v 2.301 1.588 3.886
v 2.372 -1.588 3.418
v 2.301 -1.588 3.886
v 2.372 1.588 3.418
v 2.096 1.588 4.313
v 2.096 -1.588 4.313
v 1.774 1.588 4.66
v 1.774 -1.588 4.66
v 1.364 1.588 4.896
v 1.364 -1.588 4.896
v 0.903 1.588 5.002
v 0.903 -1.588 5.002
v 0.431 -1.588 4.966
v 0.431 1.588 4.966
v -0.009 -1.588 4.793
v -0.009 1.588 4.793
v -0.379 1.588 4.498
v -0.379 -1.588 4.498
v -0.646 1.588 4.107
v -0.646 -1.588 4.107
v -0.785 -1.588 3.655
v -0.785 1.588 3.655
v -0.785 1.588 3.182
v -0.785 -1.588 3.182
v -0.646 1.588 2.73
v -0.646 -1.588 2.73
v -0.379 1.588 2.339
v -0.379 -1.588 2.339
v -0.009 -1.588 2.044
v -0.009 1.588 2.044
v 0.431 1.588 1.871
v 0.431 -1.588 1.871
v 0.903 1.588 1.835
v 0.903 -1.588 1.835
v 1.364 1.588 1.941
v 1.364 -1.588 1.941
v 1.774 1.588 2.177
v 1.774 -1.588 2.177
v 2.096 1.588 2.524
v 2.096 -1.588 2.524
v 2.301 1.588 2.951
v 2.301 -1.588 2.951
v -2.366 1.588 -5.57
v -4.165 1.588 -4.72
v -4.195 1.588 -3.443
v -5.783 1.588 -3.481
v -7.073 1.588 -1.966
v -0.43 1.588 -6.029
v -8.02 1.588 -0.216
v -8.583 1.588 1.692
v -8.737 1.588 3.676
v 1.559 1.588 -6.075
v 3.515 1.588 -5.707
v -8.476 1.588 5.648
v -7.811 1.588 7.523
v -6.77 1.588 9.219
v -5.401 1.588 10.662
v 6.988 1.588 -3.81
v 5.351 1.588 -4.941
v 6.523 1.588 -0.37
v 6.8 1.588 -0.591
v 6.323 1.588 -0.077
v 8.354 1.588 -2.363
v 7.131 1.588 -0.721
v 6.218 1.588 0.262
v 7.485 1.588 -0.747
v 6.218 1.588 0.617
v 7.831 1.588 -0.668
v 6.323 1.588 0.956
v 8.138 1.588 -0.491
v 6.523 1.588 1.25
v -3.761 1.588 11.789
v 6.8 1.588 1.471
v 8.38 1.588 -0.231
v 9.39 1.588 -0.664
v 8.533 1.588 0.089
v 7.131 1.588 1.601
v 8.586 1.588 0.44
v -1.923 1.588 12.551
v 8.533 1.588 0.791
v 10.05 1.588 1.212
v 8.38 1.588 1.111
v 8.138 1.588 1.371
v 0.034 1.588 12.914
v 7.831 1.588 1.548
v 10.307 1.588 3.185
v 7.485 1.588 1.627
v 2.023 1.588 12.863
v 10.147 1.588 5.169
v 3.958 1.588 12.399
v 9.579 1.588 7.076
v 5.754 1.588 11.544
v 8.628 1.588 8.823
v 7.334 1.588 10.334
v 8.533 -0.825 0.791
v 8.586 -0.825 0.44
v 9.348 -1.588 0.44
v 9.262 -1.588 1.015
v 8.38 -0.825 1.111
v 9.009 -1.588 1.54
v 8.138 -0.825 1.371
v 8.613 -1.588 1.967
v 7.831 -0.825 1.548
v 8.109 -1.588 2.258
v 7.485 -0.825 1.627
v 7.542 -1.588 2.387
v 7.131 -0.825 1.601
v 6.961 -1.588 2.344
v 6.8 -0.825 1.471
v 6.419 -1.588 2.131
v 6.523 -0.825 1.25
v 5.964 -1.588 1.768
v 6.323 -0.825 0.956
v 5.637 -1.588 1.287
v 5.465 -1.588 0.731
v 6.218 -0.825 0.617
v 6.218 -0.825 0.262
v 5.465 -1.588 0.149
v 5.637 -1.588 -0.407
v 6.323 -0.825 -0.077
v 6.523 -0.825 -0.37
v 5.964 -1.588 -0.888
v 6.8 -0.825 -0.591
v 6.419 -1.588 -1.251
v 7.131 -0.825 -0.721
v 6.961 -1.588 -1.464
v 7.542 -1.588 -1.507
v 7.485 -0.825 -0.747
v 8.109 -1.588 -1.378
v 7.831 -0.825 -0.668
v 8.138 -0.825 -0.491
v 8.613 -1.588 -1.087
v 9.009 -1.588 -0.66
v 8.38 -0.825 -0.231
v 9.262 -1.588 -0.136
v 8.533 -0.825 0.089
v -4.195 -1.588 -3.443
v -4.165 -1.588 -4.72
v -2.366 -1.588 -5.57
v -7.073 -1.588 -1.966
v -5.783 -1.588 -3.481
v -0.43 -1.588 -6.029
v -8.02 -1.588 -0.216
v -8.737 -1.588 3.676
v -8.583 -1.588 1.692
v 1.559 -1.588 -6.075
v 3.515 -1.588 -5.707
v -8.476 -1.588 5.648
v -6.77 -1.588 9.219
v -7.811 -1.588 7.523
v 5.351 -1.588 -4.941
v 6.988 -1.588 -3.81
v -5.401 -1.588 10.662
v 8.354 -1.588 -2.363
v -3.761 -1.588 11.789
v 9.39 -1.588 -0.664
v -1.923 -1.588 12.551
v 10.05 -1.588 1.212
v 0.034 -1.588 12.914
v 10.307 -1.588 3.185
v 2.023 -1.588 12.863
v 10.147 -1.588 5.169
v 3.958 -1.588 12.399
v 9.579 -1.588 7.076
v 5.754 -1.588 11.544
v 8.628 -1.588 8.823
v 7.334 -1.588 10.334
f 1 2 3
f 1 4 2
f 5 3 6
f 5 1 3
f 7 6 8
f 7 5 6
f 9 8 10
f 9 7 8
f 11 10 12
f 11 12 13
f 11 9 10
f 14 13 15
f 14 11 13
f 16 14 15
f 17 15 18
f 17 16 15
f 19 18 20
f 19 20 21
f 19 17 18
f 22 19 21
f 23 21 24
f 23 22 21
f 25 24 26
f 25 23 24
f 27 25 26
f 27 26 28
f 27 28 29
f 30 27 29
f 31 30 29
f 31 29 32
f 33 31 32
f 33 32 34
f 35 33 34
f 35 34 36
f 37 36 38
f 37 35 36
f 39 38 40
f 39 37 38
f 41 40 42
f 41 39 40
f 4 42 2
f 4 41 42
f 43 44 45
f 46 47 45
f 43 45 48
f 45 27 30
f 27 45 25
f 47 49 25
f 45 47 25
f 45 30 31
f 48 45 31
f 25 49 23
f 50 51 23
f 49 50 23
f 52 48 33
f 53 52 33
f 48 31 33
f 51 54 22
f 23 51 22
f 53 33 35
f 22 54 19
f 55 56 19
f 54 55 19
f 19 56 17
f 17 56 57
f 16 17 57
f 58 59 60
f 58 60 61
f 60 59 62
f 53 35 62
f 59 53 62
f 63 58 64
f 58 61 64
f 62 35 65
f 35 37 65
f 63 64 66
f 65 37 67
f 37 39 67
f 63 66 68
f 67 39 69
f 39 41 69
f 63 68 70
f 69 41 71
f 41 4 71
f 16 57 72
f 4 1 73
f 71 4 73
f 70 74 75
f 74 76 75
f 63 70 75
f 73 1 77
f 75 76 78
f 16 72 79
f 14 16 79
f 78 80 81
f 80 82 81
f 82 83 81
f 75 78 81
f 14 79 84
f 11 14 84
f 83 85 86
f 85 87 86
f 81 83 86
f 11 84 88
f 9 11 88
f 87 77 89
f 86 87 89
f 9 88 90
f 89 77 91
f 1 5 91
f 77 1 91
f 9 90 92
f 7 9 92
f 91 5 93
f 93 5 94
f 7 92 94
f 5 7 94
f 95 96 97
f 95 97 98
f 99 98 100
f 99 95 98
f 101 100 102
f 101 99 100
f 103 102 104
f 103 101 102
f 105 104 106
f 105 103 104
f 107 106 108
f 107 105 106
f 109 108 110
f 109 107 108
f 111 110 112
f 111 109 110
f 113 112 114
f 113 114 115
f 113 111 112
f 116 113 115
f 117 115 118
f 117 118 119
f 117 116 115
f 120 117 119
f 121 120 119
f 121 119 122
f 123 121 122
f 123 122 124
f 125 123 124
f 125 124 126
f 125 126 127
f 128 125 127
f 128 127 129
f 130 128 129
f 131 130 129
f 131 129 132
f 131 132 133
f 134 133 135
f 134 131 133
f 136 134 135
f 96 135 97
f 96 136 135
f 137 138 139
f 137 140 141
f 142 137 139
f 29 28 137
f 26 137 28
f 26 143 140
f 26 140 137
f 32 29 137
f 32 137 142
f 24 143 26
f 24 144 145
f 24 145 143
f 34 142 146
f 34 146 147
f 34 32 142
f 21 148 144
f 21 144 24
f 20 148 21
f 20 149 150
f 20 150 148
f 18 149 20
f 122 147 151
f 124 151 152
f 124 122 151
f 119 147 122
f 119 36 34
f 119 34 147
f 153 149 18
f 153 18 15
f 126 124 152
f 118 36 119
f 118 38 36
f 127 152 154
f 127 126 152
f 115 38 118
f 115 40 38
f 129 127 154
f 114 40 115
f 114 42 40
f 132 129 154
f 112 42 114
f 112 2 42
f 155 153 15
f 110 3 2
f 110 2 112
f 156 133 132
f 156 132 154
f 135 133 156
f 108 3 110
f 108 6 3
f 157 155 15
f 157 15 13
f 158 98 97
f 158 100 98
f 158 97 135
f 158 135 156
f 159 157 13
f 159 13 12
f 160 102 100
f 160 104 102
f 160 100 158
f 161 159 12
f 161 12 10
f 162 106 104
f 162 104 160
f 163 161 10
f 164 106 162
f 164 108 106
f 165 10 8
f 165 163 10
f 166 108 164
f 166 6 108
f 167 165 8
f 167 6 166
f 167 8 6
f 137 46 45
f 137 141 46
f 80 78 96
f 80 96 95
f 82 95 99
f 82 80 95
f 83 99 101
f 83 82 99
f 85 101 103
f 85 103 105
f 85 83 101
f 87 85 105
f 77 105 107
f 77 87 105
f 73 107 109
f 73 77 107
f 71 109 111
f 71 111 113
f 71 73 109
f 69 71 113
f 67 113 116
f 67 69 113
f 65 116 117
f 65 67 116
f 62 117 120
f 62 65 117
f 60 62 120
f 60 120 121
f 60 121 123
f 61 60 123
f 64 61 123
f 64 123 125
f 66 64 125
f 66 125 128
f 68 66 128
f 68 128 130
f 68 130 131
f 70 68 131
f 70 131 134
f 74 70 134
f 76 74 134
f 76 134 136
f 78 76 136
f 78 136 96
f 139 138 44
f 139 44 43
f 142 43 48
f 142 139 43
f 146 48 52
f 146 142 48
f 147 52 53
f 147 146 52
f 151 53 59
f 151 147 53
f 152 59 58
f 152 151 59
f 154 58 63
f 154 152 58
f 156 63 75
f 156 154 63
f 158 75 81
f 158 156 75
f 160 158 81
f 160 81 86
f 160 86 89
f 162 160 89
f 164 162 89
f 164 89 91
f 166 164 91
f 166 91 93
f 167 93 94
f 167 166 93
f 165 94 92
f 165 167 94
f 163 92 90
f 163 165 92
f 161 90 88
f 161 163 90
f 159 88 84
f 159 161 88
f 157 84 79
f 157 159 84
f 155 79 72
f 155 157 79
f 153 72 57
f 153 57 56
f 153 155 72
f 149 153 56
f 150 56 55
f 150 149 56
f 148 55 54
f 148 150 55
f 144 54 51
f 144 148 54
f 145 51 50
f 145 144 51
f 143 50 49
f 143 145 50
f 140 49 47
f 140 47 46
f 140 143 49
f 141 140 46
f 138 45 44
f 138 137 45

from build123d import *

# Parameters (mm, degrees)
F0_R     = 1.190625
F0_R_2   = 1.5875
F1_DEPTH = 1.5875
F2_SIZE  = 0.762


with BuildPart() as f1:
    # F0 (on Front) → F1 (new body, symmetric)
    with BuildSketch(Plane.XZ):
        with BuildLine():
            Line((-4.19507, -3.443071), (-4.164685, -4.719849))
            ThreePointArc((-4.164685, -4.719849), (6.575626, 10.980695), (-5.78257, -3.480852))
            Line((-5.78257, -3.480852), (-4.19507, -3.443071))
        make_face()
        with Locations((7.395771, 0.439879)):
            Circle(F0_R, mode=Mode.SUBTRACT)
        with Locations((0.784385, 3.418477)):
            Circle(F0_R_2, mode=Mode.SUBTRACT)
    extrude(amount=F1_DEPTH, both=True)

    # F2
    f2_edges = [f1.edges().sort_by_distance(p)[0] for p in [
        (6.205146, -1.5875, 0.439879),
    ]]
    chamfer(f2_edges, length=F2_SIZE)


solid = f1.part
